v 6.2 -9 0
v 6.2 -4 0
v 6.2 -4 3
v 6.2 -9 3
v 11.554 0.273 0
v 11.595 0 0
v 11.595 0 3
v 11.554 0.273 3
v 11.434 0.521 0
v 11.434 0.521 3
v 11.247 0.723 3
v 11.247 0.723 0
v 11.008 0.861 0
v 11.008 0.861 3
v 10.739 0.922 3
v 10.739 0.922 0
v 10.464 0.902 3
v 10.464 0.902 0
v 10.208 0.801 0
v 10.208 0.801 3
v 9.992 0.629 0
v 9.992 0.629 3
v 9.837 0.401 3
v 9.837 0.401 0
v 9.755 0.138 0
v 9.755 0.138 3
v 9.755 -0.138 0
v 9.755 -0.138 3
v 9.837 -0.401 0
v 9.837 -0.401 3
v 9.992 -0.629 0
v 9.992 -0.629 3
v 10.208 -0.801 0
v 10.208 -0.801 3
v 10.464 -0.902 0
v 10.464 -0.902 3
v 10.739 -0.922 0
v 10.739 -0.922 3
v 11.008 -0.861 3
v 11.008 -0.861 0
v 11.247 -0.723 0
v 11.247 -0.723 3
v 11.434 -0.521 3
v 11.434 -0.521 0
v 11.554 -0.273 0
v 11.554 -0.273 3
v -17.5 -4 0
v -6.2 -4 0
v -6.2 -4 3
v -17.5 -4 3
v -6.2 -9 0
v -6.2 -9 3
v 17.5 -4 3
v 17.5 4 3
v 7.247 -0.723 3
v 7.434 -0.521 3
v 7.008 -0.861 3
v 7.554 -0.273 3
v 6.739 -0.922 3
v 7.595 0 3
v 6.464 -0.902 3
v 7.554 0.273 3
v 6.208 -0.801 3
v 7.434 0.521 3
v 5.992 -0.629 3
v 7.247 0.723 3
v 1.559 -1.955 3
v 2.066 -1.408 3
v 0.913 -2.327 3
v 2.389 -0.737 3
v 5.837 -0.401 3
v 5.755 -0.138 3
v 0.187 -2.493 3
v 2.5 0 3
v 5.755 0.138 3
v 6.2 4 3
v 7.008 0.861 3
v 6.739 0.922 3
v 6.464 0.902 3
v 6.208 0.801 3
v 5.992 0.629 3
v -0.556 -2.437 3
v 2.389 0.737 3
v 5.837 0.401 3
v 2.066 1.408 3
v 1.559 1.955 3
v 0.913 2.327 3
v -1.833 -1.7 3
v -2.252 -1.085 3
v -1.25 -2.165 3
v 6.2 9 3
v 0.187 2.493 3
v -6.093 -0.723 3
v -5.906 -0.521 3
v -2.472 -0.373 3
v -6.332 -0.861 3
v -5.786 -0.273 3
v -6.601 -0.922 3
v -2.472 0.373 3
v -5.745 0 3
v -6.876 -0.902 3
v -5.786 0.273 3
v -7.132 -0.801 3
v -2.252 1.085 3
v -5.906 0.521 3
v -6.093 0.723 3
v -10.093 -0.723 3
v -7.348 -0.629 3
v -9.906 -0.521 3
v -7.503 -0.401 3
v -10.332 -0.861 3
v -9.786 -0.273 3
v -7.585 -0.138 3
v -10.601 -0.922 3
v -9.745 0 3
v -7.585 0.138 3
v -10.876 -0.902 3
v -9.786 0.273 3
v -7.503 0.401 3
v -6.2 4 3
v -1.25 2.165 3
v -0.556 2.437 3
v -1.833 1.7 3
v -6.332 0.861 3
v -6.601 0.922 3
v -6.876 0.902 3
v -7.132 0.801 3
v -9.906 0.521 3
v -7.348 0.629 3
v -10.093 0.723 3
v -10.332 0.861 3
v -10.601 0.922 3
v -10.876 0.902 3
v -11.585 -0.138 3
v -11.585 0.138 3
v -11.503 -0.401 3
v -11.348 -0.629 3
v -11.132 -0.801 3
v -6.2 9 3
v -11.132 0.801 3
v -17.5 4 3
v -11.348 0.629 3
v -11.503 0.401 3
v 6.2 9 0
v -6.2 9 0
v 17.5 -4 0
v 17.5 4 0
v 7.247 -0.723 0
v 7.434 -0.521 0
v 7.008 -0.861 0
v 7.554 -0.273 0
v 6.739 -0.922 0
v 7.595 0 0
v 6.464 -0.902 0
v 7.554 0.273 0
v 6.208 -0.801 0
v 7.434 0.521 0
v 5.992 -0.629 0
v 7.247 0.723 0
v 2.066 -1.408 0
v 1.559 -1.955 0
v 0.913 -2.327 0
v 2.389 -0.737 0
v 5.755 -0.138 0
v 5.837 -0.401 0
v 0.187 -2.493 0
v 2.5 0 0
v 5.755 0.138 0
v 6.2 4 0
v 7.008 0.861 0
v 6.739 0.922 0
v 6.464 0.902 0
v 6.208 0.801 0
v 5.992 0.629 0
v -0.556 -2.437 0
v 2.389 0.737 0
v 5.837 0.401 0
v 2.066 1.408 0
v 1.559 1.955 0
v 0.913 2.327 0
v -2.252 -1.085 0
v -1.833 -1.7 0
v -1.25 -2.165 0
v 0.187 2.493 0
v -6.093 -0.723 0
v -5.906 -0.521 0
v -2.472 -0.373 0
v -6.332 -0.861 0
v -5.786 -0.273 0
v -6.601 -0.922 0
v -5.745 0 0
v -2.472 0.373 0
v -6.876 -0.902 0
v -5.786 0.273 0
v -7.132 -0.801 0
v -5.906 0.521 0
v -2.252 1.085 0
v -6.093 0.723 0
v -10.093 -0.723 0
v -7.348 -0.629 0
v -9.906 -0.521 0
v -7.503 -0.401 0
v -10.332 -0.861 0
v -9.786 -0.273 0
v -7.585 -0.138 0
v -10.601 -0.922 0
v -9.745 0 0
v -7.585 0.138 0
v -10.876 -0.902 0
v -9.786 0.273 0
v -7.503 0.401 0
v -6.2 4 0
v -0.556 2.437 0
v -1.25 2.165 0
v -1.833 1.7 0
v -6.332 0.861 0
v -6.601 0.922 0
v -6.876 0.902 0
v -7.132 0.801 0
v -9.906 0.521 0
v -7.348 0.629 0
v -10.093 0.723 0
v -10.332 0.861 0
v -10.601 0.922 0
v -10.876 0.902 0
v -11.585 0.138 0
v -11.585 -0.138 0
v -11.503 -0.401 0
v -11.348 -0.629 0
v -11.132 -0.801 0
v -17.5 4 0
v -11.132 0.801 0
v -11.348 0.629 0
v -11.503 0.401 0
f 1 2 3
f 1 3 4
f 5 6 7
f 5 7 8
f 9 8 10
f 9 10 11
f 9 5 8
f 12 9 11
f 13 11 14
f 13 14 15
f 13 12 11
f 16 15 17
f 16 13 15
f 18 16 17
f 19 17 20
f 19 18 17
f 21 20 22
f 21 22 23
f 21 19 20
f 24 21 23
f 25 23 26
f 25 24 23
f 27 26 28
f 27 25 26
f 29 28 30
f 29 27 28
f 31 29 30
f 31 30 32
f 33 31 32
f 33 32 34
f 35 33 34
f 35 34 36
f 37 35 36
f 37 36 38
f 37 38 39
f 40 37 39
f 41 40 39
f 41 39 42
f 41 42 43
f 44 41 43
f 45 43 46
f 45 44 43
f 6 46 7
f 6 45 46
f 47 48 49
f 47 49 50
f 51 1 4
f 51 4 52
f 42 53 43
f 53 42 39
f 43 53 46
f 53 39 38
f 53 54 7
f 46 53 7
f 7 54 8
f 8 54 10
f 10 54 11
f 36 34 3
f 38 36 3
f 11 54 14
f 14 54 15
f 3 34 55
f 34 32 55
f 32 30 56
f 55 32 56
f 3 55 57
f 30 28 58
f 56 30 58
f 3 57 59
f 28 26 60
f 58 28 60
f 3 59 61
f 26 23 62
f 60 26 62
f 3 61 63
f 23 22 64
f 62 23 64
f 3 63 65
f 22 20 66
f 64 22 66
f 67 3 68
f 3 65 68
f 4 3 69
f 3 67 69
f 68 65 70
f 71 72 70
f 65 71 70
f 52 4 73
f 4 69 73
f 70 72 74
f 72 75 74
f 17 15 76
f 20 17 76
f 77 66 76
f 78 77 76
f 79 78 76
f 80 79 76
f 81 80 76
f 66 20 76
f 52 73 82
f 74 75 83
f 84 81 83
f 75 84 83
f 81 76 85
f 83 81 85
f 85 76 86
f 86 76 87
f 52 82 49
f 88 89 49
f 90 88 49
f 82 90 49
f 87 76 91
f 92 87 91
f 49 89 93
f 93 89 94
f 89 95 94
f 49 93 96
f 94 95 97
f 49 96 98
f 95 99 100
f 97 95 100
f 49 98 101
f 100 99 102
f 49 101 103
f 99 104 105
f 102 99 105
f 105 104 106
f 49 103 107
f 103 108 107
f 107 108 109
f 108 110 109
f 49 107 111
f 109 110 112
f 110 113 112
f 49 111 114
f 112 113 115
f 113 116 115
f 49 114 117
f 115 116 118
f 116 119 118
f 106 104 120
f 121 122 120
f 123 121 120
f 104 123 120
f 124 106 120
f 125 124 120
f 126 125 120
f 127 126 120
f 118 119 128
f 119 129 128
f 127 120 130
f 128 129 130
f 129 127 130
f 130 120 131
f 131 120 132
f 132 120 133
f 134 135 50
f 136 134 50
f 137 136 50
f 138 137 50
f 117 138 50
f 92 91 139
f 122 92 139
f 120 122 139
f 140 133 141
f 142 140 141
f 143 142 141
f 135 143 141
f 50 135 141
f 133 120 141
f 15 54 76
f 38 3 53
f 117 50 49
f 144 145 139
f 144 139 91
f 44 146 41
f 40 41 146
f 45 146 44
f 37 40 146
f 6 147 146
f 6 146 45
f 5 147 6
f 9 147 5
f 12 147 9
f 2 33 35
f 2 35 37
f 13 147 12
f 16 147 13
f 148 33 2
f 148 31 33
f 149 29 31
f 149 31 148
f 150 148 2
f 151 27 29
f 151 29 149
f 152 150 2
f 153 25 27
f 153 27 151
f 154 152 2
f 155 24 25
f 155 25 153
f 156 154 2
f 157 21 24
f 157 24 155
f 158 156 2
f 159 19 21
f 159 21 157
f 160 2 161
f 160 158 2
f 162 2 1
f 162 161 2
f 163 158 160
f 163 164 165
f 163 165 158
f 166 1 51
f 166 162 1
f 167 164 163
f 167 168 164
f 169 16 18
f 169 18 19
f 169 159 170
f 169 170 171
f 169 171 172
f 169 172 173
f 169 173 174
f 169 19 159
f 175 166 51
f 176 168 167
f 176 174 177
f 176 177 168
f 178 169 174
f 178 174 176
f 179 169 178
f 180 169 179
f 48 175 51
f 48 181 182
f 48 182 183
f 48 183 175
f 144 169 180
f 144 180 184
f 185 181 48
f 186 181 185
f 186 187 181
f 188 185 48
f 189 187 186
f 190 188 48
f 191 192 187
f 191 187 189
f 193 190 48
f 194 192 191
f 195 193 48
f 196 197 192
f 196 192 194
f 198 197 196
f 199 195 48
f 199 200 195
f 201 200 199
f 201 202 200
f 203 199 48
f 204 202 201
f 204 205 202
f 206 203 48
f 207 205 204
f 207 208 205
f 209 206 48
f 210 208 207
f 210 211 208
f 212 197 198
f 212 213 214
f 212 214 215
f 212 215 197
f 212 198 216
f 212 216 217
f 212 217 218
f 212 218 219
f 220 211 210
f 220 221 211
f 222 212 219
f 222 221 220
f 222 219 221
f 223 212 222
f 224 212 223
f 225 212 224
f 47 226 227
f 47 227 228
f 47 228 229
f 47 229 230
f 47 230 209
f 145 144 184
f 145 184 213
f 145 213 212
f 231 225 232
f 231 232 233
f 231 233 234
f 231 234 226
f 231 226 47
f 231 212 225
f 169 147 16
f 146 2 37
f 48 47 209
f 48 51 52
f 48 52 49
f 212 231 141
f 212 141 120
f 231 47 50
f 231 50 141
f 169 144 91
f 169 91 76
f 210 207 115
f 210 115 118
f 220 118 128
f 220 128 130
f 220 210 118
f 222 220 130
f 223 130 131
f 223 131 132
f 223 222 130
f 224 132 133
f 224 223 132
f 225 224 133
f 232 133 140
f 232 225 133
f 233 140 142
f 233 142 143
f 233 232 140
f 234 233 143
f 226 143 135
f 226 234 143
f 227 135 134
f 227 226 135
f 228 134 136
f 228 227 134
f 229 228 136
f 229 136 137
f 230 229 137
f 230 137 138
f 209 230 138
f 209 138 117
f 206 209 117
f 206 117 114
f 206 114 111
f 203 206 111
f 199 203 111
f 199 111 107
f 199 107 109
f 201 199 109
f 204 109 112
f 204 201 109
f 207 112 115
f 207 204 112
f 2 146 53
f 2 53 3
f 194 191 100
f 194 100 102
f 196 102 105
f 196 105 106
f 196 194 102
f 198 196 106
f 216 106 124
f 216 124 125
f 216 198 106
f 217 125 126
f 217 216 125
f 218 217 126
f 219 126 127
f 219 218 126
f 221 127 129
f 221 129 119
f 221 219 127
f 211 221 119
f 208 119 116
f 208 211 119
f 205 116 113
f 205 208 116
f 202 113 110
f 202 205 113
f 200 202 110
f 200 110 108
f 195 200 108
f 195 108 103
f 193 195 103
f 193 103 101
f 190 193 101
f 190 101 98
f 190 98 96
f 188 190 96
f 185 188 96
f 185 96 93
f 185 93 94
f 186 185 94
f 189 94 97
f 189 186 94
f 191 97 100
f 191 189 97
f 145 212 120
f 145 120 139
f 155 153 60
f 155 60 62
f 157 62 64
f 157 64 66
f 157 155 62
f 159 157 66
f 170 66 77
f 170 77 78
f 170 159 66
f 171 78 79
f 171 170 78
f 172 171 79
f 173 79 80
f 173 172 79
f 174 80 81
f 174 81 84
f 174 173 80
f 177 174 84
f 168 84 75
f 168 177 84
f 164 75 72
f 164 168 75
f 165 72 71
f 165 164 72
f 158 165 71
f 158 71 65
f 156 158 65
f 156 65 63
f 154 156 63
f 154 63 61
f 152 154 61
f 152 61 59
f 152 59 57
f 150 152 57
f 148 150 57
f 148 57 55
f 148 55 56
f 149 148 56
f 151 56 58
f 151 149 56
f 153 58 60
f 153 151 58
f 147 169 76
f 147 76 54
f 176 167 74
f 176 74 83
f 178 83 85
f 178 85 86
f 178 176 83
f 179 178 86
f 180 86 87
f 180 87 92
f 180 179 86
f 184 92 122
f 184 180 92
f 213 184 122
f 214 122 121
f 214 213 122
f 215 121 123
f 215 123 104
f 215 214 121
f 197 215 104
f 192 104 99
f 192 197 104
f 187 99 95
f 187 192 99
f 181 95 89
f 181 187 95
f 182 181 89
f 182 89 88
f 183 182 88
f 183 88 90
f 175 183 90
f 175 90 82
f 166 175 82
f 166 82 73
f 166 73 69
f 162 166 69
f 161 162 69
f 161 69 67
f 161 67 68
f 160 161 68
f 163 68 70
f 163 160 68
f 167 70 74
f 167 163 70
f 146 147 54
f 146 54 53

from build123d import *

# Parameters (mm, degrees)
ESQUISSE1_R        = 2.5
ESQUISSE1_R_2      = 0.925
BOSS_EXTRU_1_DEPTH = 3


with BuildPart() as part:
    # Esquisse1 → Boss.-Extru.1 (new body)
    with BuildSketch(Plane.XY):
        Polygon((-17.5, -4), (-17.5, 4), (-6.2, 4), (-6.2, 9), (6.2, 9), (6.2, 4), (17.5, 4), (17.5, -4), (6.2, -4), (6.2, -9), (-6.2, -9), (-6.2, -4), align=None)
        Circle(ESQUISSE1_R, mode=Mode.SUBTRACT)
        with Locations((6.67, 0)):
            Circle(ESQUISSE1_R_2, mode=Mode.SUBTRACT)
        with Locations((10.67, 0)):
            Circle(ESQUISSE1_R_2, mode=Mode.SUBTRACT)
        with Locations((-6.67, 0)):
            Circle(ESQUISSE1_R_2, mode=Mode.SUBTRACT)
        with Locations((-10.67, 0)):
            Circle(ESQUISSE1_R_2, mode=Mode.SUBTRACT)
    extrude(amount=BOSS_EXTRU_1_DEPTH)


solid = part.part
